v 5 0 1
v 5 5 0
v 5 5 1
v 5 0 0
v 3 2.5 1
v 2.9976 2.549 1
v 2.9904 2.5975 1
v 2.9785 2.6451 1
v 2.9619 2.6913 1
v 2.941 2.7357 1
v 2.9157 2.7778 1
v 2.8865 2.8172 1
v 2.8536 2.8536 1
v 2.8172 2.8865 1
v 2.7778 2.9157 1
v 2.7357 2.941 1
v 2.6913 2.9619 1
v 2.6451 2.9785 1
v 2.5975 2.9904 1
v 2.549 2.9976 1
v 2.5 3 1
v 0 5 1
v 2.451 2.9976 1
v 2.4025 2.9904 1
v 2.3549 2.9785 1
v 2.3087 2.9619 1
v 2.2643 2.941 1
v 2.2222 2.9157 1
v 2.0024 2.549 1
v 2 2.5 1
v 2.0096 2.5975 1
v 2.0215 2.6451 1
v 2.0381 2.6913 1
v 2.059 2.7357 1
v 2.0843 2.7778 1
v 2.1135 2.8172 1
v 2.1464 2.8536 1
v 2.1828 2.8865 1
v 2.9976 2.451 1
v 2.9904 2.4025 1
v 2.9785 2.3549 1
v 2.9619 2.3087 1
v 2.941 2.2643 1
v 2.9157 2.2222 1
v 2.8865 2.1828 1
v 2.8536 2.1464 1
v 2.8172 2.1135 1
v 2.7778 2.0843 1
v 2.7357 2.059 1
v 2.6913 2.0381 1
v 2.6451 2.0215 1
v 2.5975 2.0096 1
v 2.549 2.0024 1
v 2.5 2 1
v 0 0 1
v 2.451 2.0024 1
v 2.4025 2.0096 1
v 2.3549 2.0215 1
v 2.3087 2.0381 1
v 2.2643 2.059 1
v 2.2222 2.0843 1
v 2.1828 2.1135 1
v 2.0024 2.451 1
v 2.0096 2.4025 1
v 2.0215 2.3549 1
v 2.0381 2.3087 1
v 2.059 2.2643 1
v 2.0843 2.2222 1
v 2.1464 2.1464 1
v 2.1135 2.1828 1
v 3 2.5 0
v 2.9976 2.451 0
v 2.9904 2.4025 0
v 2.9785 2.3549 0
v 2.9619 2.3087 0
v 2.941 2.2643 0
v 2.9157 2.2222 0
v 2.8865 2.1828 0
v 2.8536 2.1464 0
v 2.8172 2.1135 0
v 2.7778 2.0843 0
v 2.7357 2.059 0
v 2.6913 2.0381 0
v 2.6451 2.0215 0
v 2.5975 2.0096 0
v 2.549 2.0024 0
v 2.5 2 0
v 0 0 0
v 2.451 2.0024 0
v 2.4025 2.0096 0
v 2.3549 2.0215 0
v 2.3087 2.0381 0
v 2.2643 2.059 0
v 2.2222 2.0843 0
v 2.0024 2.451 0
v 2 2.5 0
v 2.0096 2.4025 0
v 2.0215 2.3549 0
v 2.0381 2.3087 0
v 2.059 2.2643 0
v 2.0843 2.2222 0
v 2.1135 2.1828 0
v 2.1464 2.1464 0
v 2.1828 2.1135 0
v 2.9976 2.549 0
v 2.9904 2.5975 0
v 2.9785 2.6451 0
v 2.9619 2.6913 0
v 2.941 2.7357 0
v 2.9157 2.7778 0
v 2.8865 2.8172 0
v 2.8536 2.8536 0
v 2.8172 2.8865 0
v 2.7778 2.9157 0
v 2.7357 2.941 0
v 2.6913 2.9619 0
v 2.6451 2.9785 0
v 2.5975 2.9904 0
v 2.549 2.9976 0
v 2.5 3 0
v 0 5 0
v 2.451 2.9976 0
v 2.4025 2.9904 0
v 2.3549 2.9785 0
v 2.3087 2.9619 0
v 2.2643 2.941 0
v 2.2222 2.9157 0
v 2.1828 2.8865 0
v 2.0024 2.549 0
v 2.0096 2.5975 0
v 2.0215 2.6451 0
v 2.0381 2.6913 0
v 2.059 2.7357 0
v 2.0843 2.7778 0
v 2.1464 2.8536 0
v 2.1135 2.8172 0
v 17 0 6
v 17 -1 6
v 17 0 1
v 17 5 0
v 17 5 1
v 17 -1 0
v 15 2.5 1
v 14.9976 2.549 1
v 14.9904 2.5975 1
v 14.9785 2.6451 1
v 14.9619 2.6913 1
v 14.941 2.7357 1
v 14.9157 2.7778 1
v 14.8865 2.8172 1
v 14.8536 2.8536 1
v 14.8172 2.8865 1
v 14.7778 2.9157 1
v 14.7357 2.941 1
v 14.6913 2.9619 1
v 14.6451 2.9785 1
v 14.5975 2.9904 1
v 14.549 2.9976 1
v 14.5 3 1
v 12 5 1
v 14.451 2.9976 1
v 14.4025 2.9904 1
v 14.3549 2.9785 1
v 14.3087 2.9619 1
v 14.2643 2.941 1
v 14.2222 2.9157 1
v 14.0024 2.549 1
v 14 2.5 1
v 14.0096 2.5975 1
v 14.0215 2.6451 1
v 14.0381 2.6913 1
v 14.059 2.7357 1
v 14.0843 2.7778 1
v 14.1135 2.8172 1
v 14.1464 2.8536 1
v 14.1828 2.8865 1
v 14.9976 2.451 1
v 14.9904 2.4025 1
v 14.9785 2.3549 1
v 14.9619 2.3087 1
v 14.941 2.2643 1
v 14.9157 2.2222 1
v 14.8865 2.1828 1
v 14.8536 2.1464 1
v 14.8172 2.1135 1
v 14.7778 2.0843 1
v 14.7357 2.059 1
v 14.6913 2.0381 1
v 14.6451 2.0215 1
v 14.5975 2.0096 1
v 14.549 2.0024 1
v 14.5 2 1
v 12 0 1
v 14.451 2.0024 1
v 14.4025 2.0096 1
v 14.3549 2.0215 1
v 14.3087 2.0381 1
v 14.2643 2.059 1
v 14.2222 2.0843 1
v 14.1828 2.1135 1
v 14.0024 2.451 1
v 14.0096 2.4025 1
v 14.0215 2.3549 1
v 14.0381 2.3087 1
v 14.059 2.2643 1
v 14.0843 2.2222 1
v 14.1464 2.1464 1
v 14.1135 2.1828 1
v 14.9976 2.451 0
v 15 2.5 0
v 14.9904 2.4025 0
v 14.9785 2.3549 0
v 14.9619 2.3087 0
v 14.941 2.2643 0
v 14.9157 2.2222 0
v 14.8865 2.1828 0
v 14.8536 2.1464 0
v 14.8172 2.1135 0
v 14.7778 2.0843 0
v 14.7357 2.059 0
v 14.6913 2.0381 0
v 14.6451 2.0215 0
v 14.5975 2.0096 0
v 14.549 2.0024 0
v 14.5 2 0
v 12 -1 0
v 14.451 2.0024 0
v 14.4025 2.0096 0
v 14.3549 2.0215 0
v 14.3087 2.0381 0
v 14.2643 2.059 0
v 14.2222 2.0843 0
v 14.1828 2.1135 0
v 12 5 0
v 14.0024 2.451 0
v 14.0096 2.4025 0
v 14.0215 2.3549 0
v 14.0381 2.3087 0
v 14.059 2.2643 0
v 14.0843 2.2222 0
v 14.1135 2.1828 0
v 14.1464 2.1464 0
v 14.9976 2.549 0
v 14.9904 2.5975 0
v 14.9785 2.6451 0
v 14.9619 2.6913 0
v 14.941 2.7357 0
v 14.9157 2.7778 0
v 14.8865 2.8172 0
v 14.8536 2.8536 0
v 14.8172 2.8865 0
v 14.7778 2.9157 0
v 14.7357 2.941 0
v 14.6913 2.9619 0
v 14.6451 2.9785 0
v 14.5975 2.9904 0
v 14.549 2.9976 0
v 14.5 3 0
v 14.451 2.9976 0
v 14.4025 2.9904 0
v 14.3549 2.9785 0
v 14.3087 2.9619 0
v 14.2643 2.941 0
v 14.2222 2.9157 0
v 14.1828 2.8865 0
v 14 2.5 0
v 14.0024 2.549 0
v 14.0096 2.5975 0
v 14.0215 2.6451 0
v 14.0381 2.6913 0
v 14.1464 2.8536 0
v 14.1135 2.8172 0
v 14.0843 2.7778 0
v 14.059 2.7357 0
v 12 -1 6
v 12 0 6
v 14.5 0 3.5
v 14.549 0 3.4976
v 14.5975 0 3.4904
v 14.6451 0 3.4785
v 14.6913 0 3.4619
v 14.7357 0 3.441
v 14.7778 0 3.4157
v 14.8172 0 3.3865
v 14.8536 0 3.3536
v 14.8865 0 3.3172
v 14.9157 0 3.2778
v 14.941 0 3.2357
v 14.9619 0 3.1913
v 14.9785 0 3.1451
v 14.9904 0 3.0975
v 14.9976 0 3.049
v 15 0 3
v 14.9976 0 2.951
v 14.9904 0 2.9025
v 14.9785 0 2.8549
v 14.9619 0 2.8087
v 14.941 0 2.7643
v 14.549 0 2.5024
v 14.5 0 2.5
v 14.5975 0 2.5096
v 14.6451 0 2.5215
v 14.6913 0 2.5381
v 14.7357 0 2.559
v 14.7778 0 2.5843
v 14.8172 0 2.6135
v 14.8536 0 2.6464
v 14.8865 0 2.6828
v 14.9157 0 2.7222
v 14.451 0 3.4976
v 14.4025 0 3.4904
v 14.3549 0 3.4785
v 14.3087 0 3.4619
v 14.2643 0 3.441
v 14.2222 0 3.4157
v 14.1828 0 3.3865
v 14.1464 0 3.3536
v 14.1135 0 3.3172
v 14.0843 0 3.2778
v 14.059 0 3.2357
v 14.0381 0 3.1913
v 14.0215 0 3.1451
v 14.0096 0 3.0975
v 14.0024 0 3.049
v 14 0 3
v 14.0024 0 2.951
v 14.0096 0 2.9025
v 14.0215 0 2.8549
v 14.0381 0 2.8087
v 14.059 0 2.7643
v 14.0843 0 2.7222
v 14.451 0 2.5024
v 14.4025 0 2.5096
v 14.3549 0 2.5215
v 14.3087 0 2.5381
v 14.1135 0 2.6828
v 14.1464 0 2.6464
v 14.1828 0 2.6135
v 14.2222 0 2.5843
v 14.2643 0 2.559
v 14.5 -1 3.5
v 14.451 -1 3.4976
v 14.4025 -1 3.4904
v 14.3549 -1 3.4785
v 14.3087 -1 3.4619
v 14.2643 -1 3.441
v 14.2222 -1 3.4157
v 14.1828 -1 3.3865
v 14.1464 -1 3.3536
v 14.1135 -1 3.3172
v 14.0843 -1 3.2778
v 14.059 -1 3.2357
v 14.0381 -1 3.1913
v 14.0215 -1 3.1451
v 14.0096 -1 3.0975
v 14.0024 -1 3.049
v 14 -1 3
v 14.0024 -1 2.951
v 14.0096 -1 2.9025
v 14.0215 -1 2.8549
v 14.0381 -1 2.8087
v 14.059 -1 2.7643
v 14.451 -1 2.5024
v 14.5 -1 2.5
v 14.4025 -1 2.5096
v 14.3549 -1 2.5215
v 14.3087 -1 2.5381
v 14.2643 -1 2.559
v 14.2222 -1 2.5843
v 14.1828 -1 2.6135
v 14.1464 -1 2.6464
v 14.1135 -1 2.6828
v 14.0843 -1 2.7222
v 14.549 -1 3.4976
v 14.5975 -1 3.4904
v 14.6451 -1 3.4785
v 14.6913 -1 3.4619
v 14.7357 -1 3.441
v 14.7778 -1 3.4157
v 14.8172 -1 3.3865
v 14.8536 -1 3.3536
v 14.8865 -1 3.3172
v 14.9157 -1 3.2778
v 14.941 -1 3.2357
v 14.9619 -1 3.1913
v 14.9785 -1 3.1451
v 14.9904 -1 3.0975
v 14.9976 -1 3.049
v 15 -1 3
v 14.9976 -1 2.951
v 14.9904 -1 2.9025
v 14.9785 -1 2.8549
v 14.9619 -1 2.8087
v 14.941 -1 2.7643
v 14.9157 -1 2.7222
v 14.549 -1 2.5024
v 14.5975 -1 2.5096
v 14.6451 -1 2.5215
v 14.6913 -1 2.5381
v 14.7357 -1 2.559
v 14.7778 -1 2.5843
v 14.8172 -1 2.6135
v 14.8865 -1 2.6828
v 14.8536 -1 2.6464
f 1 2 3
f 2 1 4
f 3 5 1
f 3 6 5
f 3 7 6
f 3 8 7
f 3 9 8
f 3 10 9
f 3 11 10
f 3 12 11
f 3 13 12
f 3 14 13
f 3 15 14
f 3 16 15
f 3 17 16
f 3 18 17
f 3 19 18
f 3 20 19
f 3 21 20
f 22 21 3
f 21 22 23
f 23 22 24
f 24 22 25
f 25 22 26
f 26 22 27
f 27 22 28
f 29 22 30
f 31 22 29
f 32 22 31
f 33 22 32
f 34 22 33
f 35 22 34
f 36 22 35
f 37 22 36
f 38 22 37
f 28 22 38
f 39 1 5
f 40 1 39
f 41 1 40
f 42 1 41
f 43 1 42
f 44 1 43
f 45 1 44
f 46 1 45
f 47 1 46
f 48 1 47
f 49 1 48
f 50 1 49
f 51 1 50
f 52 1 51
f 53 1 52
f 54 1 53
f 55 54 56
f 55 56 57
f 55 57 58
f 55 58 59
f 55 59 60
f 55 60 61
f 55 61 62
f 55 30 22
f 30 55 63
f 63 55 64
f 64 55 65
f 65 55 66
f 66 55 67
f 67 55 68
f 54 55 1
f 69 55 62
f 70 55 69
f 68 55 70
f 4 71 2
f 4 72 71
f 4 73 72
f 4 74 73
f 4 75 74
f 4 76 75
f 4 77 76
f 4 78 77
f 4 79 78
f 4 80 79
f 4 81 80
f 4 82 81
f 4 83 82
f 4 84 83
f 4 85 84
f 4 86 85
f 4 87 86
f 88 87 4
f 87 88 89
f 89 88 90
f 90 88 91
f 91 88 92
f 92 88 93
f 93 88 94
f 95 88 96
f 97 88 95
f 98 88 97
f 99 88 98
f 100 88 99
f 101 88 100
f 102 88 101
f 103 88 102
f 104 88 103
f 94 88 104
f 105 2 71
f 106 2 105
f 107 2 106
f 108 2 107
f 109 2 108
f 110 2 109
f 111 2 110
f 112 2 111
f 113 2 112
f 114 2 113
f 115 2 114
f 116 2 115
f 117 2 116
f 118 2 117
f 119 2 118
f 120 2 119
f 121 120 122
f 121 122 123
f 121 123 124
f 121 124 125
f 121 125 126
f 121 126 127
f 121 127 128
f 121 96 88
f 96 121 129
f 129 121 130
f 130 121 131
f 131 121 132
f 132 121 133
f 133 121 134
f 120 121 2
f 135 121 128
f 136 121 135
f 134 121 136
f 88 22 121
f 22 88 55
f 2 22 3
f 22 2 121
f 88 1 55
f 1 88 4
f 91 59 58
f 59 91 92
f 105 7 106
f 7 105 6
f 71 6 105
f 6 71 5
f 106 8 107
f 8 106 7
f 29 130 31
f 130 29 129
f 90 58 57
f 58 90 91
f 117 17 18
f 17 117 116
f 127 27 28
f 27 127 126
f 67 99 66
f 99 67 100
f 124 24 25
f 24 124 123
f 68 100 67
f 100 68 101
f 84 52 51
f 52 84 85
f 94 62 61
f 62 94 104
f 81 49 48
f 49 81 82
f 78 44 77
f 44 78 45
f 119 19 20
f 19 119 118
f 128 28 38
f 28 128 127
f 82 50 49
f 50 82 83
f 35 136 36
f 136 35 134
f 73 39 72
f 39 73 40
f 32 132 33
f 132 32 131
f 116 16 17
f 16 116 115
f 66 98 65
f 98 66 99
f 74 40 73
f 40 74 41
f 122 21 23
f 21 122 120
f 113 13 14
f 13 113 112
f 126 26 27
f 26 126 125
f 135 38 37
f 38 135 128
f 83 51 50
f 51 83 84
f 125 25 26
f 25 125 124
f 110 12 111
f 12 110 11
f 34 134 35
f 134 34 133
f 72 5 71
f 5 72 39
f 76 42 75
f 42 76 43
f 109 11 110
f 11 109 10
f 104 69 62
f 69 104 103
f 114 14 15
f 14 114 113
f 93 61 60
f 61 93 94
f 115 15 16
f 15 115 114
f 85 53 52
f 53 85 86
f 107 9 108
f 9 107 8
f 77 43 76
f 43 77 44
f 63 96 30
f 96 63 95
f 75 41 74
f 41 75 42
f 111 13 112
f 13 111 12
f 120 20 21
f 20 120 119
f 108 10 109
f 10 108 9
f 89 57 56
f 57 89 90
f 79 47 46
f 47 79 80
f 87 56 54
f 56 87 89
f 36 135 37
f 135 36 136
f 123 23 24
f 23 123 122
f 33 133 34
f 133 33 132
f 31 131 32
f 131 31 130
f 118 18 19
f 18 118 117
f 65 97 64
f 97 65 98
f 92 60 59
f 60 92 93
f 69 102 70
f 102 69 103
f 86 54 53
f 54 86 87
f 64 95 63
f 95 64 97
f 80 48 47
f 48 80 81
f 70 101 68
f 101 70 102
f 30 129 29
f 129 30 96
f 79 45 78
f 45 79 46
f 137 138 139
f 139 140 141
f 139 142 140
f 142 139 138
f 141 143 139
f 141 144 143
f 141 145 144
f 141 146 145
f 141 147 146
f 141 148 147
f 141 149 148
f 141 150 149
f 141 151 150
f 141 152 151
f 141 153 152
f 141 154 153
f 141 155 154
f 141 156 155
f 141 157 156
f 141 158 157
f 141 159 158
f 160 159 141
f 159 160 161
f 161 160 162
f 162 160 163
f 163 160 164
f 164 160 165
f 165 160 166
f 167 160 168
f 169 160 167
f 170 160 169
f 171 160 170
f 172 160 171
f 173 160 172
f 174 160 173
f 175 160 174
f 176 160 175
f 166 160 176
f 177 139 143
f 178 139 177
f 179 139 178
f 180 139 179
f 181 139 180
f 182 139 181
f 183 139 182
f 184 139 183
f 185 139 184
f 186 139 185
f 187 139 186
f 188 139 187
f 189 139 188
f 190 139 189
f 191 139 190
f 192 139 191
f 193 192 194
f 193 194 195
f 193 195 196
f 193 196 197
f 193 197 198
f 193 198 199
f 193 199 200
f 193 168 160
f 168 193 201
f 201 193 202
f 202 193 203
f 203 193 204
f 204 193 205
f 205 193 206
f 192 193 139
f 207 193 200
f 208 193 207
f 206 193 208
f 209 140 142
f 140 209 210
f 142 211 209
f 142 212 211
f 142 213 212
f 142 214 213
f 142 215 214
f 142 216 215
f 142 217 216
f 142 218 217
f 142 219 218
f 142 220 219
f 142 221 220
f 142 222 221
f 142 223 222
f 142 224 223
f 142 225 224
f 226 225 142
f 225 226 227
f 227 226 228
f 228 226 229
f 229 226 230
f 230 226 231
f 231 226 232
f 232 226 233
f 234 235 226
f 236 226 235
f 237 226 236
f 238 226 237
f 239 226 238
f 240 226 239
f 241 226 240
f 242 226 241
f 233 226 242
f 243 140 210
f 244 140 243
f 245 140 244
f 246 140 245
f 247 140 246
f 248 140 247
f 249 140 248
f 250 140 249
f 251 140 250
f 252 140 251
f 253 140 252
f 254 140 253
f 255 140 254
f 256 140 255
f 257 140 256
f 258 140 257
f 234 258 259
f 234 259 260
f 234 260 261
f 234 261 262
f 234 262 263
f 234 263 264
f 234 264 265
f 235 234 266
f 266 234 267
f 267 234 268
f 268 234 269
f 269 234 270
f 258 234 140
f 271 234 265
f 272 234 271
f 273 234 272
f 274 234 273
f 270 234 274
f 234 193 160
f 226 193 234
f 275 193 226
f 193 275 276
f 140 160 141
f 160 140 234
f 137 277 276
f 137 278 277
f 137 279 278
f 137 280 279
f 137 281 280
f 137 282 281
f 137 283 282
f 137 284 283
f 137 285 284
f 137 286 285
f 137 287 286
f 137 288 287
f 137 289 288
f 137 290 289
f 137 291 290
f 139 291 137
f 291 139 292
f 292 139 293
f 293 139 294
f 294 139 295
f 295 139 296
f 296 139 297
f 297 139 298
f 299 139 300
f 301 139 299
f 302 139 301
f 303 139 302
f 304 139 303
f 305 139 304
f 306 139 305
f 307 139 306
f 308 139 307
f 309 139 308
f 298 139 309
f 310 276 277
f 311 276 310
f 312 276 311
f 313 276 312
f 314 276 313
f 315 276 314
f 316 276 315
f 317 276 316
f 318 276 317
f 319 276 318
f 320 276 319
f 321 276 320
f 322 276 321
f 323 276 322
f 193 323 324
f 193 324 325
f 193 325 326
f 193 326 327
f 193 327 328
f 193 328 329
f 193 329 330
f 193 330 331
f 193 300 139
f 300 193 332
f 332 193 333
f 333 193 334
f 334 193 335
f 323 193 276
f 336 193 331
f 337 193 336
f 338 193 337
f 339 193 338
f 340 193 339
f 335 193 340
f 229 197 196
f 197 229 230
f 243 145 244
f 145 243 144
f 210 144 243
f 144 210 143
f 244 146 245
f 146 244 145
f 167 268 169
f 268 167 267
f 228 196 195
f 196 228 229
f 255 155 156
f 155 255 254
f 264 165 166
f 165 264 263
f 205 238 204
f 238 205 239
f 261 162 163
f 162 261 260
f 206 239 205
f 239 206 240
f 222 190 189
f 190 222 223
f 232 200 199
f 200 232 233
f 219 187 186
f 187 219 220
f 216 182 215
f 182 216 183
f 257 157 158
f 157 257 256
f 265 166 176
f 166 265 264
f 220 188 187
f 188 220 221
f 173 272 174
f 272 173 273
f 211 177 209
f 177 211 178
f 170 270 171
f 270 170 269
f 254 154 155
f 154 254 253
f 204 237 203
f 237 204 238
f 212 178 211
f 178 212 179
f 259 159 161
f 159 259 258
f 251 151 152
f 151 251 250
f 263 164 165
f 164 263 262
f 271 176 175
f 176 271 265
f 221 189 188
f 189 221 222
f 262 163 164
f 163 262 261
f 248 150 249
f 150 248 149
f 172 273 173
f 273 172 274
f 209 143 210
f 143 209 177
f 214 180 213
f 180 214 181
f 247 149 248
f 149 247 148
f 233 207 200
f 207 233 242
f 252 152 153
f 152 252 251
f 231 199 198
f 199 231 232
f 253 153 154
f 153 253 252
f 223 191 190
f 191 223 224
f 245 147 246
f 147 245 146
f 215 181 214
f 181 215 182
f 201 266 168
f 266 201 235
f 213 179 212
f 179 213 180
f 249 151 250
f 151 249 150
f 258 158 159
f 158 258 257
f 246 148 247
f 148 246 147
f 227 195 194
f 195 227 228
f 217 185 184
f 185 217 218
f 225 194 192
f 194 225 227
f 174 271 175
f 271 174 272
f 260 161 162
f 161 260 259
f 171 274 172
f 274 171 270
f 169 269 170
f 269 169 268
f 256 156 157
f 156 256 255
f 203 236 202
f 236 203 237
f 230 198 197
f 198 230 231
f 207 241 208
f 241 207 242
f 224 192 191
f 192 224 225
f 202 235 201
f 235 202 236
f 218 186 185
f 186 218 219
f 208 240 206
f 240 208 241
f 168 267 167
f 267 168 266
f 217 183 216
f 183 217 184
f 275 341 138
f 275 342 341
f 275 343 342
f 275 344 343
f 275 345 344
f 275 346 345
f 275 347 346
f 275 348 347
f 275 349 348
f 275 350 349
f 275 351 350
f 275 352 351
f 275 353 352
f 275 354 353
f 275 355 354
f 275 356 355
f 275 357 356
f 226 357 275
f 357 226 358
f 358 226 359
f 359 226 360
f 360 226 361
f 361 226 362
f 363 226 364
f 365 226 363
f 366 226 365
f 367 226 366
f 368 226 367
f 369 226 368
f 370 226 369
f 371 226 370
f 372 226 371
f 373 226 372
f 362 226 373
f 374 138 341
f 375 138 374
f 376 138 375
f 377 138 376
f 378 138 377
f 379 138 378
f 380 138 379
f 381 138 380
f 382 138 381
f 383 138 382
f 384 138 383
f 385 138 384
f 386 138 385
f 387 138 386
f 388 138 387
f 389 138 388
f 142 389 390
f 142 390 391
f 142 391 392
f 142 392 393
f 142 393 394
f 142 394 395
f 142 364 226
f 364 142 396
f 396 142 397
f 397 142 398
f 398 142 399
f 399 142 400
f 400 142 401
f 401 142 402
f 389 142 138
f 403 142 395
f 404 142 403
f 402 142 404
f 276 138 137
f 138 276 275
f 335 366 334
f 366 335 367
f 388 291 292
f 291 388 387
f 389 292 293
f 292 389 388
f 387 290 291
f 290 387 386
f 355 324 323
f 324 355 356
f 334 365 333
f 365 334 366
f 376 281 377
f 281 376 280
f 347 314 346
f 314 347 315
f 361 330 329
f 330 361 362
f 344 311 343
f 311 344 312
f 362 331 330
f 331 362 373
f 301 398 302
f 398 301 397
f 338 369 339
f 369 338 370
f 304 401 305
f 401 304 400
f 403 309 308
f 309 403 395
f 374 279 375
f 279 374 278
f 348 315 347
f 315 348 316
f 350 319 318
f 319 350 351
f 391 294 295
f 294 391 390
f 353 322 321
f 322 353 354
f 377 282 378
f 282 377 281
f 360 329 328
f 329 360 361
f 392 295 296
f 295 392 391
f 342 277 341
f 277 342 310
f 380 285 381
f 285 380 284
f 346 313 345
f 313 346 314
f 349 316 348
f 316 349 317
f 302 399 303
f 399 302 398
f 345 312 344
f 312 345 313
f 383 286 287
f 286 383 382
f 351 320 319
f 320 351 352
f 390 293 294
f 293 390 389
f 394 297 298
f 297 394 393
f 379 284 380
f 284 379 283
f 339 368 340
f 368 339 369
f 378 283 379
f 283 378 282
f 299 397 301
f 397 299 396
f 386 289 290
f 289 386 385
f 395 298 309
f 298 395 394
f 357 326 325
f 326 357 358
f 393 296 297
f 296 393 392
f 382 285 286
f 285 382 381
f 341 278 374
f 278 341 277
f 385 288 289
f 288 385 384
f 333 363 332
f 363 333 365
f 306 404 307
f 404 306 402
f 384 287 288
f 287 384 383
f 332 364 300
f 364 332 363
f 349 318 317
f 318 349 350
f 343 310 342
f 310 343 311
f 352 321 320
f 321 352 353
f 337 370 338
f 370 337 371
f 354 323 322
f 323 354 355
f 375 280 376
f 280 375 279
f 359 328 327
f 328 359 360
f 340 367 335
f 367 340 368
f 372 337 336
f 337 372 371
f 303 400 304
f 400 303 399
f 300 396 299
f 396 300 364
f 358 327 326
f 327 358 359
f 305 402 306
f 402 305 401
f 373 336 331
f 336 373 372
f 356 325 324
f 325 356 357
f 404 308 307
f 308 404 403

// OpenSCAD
// OpenSCAD demo after https://www.youtube.com/watch?v=sw3I1xxjMWE
$fn=64;

// Simple plate with a hole
/*
difference() {
    cube([5, 5, 1]);
    translate([2.5, 2.5, -0.1]) {
        cylinder(r=1, h=1.2);
    }
}
*/

// Module: name an object
module plate(l, w, h) {
difference() {
        cube([l, w, h]);
        translate([l/2, w/2, -0.1]) {
            cylinder(r=0.5, h=h+.2);
        }
    }
}

/*
rotate(a=60, v=[1, 1, 1]) {
    translate ([-3, -3, 0]) {
        plate();
    }
}
*/

// Scaling
plate(5, 5, 1);

// OpenSCAD demo after https://www.youtube.com/watch?v=6gBMm6r28vM
module bracket(l, w, h) {
    plate(l, w, h);
    rotate(a=90, v=[1, 0, 0]) {
        plate(l, w+h, h);
    }
}

translate([12, 0, 0]) {
    bracket(5, 5, 1);
}
